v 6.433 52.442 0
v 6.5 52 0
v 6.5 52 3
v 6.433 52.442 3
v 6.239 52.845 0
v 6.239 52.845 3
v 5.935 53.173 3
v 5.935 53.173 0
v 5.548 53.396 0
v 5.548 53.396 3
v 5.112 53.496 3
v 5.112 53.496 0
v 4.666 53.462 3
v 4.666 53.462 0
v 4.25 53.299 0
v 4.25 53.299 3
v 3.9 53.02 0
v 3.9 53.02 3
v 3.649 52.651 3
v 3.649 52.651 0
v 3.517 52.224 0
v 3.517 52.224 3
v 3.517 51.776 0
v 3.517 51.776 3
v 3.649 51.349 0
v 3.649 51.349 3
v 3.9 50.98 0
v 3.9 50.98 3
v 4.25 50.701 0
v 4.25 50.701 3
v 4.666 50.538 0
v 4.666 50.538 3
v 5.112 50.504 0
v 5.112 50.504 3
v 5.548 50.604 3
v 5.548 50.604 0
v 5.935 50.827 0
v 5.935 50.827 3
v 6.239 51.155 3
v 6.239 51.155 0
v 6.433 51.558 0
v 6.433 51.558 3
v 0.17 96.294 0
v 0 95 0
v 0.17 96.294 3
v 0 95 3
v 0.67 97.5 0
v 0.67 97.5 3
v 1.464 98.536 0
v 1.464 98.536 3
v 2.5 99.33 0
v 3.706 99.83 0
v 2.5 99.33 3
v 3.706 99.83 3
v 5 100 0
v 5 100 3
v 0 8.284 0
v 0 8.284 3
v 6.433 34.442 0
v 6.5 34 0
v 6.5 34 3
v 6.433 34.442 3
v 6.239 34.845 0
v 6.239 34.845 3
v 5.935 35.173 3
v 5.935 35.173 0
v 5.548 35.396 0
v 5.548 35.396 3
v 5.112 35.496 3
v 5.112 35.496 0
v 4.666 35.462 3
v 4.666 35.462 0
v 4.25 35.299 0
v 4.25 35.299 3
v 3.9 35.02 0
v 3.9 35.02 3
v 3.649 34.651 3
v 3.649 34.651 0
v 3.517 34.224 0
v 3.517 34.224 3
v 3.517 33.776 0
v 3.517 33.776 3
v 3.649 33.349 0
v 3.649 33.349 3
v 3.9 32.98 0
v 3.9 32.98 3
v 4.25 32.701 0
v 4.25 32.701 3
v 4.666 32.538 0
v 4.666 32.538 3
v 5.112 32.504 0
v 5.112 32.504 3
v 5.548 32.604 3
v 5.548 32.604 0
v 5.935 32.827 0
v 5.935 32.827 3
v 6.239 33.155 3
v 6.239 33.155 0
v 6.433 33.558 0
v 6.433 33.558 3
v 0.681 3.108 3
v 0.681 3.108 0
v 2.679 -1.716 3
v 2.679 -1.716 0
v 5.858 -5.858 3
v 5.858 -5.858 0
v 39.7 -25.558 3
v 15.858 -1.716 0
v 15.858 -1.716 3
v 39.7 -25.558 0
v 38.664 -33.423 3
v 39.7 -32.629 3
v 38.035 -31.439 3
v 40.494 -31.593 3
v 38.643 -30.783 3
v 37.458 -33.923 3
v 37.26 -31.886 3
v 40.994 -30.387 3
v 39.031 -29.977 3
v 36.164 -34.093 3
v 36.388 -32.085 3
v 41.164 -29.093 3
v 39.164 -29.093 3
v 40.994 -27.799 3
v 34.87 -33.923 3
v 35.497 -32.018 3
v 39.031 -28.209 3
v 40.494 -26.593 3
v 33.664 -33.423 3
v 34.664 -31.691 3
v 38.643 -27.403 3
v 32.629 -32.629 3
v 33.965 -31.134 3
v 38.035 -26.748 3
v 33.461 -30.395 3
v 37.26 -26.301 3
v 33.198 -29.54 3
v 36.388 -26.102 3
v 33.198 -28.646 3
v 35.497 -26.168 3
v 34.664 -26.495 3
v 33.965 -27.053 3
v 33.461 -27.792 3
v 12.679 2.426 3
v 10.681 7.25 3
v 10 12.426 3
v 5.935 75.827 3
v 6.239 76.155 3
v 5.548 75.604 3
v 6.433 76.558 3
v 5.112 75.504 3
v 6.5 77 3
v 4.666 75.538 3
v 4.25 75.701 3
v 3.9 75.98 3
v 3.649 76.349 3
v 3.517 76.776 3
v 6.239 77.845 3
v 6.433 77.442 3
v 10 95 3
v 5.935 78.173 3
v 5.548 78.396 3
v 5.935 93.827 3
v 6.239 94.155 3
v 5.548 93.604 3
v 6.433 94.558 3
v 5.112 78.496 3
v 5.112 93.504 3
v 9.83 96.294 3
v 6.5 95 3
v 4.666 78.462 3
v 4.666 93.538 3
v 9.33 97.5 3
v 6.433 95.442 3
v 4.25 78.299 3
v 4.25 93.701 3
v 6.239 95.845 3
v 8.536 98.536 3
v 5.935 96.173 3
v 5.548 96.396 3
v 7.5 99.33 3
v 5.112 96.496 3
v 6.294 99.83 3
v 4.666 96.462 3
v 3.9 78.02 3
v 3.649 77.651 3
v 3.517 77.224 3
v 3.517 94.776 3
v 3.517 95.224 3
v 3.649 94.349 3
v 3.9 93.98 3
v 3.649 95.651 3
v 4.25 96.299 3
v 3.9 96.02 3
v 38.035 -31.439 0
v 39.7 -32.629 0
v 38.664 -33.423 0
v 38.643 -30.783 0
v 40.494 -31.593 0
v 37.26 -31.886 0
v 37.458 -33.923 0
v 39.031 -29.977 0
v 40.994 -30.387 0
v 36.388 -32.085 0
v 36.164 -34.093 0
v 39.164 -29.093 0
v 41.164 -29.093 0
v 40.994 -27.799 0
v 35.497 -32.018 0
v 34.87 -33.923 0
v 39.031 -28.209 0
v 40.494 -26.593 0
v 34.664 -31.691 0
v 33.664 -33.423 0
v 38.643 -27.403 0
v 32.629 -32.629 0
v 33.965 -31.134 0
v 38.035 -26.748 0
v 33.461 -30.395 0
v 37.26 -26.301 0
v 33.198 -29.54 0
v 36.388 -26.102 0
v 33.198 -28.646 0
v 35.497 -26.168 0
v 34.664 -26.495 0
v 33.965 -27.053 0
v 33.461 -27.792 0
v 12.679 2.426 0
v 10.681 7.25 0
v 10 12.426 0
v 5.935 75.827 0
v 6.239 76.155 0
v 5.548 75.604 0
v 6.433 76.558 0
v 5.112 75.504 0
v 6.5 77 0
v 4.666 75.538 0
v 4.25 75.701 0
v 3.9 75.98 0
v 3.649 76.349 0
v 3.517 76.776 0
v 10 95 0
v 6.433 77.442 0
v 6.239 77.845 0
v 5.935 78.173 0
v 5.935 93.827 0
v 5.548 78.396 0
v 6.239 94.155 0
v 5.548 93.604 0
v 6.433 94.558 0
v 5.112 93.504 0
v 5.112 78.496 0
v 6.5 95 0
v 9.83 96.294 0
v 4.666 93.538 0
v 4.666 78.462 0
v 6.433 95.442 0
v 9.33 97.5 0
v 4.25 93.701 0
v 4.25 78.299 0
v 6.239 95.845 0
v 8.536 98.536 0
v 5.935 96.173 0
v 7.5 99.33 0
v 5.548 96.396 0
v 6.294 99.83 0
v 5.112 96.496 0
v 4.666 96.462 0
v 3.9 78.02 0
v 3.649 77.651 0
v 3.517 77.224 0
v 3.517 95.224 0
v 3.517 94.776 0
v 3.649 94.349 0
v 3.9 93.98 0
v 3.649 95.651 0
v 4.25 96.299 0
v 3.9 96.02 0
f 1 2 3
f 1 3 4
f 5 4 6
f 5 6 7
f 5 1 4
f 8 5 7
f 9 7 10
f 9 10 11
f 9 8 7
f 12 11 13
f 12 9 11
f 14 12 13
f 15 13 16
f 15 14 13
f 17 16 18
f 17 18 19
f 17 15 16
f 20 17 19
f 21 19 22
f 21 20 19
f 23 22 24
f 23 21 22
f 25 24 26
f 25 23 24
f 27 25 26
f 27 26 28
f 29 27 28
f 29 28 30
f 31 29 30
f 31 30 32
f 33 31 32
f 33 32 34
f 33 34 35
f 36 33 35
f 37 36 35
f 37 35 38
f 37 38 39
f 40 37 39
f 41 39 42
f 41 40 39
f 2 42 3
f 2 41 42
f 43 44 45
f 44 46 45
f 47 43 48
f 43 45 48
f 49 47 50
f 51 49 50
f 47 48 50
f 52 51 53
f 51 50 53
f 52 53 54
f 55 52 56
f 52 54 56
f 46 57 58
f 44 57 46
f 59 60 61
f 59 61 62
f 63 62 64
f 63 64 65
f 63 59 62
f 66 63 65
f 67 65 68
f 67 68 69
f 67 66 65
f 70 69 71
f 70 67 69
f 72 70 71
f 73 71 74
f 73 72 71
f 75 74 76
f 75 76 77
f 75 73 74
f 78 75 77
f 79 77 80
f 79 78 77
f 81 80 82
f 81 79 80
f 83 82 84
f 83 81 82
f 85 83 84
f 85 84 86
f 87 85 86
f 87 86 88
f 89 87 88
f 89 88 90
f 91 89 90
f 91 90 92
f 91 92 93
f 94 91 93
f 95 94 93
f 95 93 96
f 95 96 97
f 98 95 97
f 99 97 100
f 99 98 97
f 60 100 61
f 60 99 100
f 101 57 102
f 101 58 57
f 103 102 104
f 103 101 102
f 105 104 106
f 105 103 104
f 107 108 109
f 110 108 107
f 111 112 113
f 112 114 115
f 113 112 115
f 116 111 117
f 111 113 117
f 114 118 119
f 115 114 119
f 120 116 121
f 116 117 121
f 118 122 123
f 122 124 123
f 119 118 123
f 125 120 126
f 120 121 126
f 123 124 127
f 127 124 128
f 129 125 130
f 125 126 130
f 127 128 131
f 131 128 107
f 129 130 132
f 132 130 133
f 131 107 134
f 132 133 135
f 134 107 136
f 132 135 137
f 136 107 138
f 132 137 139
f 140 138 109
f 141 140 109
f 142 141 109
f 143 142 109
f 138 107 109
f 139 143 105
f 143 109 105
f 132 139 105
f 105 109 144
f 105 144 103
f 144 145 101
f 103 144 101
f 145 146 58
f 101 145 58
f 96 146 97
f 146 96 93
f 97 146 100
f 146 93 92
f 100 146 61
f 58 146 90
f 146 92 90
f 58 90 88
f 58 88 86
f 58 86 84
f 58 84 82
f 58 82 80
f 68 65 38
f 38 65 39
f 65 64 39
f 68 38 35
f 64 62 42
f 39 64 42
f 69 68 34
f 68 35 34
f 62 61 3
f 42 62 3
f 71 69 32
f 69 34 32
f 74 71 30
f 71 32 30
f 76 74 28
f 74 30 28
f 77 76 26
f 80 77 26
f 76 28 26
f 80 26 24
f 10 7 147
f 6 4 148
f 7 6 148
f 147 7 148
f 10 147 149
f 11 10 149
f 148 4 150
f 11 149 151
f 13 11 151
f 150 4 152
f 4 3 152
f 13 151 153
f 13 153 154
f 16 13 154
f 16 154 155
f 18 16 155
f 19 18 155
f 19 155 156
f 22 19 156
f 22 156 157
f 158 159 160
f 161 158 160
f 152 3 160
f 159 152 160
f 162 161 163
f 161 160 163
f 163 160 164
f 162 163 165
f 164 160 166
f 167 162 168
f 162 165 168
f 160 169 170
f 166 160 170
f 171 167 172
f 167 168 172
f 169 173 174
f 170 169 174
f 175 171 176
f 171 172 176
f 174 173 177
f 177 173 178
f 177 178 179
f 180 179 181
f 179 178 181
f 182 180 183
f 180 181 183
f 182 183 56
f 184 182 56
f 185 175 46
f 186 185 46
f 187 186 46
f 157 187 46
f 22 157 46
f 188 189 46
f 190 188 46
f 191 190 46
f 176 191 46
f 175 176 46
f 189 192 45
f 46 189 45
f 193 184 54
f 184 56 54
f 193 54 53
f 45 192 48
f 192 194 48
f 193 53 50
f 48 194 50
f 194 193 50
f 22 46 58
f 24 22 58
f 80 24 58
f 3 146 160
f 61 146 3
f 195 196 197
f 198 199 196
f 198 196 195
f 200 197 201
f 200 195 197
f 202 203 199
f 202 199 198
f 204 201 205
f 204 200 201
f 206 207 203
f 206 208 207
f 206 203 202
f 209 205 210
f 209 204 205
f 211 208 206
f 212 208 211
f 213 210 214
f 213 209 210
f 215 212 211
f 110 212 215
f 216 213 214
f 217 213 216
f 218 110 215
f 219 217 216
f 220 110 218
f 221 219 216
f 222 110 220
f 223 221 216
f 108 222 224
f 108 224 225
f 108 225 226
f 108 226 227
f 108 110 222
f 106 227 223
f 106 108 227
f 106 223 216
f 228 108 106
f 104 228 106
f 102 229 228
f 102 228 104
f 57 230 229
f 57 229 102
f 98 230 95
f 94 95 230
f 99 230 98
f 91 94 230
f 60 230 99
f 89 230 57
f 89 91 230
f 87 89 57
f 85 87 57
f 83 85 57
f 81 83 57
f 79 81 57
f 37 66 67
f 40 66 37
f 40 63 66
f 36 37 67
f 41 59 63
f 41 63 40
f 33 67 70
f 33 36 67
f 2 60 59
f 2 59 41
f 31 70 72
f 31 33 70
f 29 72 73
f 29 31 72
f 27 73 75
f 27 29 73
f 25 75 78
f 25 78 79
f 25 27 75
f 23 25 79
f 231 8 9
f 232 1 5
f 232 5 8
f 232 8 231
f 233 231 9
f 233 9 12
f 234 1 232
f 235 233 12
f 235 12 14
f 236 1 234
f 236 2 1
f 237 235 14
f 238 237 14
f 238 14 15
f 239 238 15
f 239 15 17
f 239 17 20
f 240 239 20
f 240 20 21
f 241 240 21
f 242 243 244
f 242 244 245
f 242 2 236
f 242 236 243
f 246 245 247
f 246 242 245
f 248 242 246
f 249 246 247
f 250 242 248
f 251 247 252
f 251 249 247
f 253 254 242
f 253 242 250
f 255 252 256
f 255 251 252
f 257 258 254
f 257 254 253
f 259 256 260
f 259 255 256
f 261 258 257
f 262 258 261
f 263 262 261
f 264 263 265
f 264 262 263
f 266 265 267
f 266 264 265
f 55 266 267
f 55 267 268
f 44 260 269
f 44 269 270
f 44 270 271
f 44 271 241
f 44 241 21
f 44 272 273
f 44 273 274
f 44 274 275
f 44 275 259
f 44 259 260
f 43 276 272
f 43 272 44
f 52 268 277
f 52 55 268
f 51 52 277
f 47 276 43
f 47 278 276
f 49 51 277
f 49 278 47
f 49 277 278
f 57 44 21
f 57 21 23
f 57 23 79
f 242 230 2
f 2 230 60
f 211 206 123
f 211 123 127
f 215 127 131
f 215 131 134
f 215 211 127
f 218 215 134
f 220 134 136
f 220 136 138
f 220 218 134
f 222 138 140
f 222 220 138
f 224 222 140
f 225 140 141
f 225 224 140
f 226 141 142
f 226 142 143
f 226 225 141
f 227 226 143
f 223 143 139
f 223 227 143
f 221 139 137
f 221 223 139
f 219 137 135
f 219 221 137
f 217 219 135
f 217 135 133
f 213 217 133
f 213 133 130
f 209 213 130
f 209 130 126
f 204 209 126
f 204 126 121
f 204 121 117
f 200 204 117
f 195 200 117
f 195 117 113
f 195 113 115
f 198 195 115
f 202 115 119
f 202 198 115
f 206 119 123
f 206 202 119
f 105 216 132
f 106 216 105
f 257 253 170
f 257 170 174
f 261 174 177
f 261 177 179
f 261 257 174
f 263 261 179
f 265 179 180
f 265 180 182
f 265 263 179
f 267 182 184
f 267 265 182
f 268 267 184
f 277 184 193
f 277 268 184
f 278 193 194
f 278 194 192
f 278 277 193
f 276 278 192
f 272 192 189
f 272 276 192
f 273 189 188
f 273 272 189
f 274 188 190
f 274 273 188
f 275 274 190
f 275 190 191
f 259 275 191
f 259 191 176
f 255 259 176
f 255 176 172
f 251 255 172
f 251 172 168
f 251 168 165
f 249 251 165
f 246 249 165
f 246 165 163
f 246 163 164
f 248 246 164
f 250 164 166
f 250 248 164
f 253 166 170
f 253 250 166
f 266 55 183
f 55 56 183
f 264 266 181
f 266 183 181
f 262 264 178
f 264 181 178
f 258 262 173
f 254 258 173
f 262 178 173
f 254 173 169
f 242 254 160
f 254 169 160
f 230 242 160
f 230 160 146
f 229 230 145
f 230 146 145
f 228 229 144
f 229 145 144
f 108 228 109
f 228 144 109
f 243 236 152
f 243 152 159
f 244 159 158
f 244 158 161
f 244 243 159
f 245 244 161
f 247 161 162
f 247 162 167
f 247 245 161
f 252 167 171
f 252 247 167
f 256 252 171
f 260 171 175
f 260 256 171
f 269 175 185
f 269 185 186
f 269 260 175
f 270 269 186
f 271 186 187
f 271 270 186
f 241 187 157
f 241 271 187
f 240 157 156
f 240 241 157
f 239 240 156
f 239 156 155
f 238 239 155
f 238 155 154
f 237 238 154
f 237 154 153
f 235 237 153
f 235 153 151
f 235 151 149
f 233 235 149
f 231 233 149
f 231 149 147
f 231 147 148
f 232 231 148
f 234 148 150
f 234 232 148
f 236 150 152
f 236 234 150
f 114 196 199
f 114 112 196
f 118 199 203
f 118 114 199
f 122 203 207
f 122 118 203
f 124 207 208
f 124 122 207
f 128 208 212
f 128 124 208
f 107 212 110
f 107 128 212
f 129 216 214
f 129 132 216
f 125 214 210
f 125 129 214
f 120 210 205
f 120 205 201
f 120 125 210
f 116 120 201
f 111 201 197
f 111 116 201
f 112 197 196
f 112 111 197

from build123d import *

# Parameters (mm, degrees)
SKETCH_1_R      = 1.5
SKETCH_1_R_2    = 3
EXTRUDE_1_DEPTH = 3
FILLET_1_R      = 20
FILLET_2_R      = 5
FILLET_3_R      = 5


with BuildPart() as part:
    # 草图1 → 凸台-拉伸1 (new body)
    with BuildSketch(Plane.XY):
        Polygon((0, 0), (0, 100), (10, 100), (10, 4.142135624), (43.235357393, -29.093221769), (36.164289581, -36.164289581), align=None)
        with Locations((5, 34)):
            Circle(SKETCH_1_R, mode=Mode.SUBTRACT)
        with Locations((36.164289581, -29.093221769)):
            Circle(SKETCH_1_R_2, mode=Mode.SUBTRACT)
        with Locations((5, 52)):
            Circle(SKETCH_1_R, mode=Mode.SUBTRACT)
        with Locations((5, 77)):
            Circle(SKETCH_1_R, mode=Mode.SUBTRACT)
        with Locations((5, 95)):
            Circle(SKETCH_1_R, mode=Mode.SUBTRACT)
    extrude(amount=EXTRUDE_1_DEPTH)

    # 圆角1
    fillet_1_edges = [part.edges().sort_by_distance(p)[0] for p in [
        (0, 0, 1.5),
        (10, 4.142135624, 1.5),
    ]]
    fillet(fillet_1_edges, radius=FILLET_1_R)

    # 圆角2
    fillet_2_edges = [part.edges().sort_by_distance(p)[0] for p in [
        (36.164289581, -36.164289581, 1.5),
        (43.235357393, -29.093221769, 1.5),
    ]]
    fillet(fillet_2_edges, radius=FILLET_2_R - 0.0001)  # a hair under: the kernel refuses the full size

    # 圆角3
    fillet_3_edges = [part.edges().sort_by_distance(p)[0] for p in [
        (0, 100, 1.5),
        (10, 100, 1.5),
    ]]
    fillet(fillet_3_edges, radius=FILLET_3_R - 0.0001)  # a hair under: the kernel refuses the full size


solid = part.part
